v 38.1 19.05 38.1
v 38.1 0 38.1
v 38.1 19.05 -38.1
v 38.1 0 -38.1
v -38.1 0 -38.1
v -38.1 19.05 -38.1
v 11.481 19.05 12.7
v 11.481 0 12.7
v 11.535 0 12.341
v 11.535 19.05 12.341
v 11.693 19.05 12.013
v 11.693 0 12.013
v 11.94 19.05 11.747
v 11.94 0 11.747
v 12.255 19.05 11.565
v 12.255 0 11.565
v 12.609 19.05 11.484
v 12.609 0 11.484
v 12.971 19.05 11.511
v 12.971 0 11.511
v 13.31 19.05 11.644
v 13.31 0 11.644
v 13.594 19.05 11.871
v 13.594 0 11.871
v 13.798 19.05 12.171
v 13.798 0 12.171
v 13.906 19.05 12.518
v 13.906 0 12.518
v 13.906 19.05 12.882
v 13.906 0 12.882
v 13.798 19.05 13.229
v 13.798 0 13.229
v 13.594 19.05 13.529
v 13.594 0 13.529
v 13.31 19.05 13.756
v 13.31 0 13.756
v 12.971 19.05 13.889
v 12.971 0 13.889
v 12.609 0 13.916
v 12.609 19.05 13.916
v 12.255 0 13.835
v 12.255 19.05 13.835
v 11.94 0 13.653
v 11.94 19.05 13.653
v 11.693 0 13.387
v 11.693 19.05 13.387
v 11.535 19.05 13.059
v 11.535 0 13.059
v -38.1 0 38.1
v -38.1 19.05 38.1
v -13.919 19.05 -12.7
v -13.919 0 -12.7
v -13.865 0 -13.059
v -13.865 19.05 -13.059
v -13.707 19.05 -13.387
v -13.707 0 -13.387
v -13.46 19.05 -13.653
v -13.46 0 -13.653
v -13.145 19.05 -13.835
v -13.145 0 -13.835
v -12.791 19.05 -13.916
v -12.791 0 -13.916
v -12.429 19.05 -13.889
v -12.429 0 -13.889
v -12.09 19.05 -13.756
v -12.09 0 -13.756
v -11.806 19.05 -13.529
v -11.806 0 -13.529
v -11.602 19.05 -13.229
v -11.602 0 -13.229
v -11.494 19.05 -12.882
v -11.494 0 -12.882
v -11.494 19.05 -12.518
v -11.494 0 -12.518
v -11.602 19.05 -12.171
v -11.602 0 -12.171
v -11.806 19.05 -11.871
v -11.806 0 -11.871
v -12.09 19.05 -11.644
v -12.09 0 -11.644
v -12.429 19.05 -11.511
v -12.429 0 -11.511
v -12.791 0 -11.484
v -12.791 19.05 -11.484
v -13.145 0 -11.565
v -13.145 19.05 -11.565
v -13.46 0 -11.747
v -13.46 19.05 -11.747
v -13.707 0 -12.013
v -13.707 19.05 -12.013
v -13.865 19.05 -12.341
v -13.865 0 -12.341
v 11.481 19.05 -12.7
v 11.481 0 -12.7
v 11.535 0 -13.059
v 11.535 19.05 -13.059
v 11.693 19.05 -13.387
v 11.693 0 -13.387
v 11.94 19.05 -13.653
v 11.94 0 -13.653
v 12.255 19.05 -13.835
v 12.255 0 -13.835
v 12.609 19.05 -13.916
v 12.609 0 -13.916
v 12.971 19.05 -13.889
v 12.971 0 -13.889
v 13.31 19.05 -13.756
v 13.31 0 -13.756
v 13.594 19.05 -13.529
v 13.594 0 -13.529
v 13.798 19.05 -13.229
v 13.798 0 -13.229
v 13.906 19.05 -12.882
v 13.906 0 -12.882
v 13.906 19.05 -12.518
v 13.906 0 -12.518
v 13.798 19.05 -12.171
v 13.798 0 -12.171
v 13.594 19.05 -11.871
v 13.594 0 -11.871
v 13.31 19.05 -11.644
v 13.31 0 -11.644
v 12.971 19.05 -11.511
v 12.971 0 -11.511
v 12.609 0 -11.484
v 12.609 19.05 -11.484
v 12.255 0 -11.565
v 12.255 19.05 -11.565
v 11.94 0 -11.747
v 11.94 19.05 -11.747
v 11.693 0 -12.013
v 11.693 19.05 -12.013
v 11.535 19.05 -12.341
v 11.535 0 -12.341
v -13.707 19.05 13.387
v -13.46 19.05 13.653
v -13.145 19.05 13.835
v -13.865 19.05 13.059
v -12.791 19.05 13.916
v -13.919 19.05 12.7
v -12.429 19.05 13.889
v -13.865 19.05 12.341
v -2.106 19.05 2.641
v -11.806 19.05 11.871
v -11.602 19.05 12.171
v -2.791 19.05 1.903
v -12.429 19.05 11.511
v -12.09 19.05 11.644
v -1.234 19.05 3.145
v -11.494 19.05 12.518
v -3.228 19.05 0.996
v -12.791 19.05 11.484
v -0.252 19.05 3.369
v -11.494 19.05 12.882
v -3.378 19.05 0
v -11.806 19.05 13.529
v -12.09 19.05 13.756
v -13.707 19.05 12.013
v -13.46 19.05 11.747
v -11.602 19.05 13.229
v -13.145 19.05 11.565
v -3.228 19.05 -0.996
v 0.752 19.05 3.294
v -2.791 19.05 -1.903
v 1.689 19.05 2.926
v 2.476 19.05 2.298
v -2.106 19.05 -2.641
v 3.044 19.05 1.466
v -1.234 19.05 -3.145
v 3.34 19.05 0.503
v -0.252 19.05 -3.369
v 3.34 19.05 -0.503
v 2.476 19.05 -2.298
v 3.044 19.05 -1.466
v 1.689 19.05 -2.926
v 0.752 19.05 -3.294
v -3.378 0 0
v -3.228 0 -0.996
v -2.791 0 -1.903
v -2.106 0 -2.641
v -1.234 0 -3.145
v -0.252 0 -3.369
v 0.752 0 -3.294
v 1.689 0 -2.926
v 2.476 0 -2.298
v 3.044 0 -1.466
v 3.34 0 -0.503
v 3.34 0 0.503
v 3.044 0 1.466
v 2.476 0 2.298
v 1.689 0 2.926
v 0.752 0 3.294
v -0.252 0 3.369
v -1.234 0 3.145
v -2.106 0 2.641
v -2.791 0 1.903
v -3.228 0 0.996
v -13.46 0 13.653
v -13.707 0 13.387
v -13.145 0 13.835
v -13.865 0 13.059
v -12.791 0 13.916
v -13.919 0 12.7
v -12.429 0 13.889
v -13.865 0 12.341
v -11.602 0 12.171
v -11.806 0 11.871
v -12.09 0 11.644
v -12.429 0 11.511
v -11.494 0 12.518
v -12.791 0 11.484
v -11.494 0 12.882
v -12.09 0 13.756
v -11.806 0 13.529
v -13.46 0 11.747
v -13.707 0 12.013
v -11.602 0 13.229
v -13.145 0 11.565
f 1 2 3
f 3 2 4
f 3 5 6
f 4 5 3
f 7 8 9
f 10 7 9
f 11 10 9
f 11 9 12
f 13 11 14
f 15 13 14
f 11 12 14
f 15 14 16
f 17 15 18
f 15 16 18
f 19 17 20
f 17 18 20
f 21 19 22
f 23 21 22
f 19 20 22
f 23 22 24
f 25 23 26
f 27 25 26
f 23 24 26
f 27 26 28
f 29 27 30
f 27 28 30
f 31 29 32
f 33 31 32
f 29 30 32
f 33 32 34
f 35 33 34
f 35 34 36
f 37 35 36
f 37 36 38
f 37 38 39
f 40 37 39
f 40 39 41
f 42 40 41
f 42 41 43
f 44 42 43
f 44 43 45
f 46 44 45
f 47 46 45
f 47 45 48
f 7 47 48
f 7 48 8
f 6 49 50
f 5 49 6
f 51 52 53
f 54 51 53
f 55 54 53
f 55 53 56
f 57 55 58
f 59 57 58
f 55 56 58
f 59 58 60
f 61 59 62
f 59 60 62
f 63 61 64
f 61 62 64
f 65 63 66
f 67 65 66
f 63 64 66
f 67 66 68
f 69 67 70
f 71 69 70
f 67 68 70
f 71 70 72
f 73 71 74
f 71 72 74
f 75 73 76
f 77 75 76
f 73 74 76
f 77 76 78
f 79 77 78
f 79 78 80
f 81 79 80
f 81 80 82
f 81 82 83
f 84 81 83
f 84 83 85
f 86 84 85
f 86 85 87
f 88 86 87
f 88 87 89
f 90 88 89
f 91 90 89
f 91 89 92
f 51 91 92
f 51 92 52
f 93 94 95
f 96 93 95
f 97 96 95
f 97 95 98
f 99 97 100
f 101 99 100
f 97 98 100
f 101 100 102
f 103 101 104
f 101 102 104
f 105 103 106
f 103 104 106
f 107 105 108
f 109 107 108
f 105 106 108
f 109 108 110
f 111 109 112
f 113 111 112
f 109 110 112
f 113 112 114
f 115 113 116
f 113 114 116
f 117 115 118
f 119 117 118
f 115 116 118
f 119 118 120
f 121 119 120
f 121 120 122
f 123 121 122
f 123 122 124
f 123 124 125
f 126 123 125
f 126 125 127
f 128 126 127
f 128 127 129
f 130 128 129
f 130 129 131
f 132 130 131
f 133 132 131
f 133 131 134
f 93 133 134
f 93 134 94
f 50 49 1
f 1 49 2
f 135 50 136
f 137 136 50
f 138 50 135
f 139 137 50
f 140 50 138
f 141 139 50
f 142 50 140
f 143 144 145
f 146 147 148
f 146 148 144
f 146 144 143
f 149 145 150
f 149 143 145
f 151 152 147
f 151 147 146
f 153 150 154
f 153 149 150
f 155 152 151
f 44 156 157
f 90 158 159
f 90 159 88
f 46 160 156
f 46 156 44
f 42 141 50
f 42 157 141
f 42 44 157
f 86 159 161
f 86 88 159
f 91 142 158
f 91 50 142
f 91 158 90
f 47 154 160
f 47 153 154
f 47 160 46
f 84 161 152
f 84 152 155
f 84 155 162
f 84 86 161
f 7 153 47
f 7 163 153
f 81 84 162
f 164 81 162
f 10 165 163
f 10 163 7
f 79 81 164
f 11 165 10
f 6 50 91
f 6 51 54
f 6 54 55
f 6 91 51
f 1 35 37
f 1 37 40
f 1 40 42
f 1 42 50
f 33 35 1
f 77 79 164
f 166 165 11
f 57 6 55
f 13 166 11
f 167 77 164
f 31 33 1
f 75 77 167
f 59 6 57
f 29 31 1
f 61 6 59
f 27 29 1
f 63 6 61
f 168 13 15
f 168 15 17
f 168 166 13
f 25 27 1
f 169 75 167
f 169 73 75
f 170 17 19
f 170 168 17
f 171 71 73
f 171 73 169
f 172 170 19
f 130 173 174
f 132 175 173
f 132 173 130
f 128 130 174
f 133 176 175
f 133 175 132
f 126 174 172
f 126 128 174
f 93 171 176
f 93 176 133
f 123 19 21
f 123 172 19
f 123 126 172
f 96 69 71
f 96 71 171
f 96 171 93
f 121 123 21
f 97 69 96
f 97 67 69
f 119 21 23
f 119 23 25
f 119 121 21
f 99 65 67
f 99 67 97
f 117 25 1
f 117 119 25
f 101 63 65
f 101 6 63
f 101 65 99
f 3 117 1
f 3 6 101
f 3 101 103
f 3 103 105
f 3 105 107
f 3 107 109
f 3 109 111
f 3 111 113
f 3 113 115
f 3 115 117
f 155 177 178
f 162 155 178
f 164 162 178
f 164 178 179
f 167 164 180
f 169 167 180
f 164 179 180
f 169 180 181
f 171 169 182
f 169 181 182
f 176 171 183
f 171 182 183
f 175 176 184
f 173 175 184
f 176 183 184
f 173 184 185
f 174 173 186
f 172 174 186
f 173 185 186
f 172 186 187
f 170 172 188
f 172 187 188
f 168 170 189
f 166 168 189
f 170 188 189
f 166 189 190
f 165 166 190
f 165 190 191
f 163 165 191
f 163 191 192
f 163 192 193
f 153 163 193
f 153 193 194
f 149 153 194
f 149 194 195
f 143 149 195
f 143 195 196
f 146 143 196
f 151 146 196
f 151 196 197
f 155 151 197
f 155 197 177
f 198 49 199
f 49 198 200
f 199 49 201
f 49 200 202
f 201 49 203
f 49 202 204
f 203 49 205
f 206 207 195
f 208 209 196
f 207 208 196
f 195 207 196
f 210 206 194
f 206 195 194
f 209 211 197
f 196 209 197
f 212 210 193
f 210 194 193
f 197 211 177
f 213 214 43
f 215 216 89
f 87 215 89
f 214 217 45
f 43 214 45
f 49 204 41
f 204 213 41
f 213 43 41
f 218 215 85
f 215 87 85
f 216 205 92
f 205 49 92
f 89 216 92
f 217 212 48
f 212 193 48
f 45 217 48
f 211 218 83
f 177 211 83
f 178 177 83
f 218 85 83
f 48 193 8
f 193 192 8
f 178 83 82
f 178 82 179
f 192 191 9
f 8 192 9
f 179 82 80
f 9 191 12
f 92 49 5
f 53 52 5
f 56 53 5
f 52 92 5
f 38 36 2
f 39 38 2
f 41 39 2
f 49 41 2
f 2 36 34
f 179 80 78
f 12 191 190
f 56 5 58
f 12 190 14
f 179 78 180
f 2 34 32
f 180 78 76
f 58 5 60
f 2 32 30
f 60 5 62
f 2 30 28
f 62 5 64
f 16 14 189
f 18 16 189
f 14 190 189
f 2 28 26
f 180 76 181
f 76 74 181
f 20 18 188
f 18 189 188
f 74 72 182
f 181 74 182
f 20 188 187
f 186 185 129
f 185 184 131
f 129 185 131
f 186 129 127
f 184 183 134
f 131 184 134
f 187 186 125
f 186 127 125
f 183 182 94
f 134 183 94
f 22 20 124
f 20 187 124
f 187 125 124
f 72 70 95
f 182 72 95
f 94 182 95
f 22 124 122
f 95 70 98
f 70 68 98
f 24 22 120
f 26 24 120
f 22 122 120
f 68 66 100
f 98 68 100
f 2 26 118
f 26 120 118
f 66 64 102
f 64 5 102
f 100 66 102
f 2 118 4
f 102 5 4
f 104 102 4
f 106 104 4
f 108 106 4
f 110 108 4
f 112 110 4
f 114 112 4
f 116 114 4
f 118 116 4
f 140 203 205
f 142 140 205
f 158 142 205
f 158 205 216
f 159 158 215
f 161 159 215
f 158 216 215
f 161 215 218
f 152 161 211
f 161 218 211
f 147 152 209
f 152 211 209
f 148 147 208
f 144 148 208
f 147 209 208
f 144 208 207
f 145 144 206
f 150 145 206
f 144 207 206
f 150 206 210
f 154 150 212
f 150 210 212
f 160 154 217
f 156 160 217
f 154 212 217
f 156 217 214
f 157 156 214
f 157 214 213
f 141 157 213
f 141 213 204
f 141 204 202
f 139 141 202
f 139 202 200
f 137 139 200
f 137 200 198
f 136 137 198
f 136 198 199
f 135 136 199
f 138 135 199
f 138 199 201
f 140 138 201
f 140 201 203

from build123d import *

# Parameters (mm, degrees)
SKETCH1_W               = 76.2
SKETCH1_H               = 76.2
BOSS_EXTRUDE1_DEPTH     = 19.05
F_1_4_CLEARANCE_HOLE1_D = 6.7564
F_2_CLEARANCE_HOLE1_D   = 2.4384
F_2_CLEARANCE_HOLE2_D   = 2.4384


with BuildPart() as part:
    # Sketch1 → Boss-Extrude1 (new body)
    with BuildSketch(Plane(origin=(0, 0, 0), x_dir=(1, 0, 0), z_dir=(0, 1, 0))):
        Rectangle(SKETCH1_W, SKETCH1_H)
    extrude(amount=BOSS_EXTRUDE1_DEPTH)

    # 1/4 Clearance Hole1 (through all)
    with Locations(Plane(origin=(0, 19.05, 0), x_dir=(1, 0, 0), z_dir=(0, 1, 0))):
        with Locations((0, 0)):
            Hole(F_1_4_CLEARANCE_HOLE1_D / 2)

    # #2 Clearance Hole1 (through all)
    with Locations(Plane(origin=(0, 19.05, 0), x_dir=(1, 0, 0), z_dir=(0, 1, 0))):
        with Locations((-12.7, 12.7), (0, 0)):
            Hole(F_2_CLEARANCE_HOLE1_D / 2)

    # #2 Clearance Hole2 (through all)
    with Locations(Plane(origin=(0, 19.05, 0), x_dir=(1, 0, 0), z_dir=(0, 1, 0))):
        with Locations((12.7, 12.7), (-12.7, -12.7), (12.7, -12.7)):
            Hole(F_2_CLEARANCE_HOLE2_D / 2)


solid = part.part
